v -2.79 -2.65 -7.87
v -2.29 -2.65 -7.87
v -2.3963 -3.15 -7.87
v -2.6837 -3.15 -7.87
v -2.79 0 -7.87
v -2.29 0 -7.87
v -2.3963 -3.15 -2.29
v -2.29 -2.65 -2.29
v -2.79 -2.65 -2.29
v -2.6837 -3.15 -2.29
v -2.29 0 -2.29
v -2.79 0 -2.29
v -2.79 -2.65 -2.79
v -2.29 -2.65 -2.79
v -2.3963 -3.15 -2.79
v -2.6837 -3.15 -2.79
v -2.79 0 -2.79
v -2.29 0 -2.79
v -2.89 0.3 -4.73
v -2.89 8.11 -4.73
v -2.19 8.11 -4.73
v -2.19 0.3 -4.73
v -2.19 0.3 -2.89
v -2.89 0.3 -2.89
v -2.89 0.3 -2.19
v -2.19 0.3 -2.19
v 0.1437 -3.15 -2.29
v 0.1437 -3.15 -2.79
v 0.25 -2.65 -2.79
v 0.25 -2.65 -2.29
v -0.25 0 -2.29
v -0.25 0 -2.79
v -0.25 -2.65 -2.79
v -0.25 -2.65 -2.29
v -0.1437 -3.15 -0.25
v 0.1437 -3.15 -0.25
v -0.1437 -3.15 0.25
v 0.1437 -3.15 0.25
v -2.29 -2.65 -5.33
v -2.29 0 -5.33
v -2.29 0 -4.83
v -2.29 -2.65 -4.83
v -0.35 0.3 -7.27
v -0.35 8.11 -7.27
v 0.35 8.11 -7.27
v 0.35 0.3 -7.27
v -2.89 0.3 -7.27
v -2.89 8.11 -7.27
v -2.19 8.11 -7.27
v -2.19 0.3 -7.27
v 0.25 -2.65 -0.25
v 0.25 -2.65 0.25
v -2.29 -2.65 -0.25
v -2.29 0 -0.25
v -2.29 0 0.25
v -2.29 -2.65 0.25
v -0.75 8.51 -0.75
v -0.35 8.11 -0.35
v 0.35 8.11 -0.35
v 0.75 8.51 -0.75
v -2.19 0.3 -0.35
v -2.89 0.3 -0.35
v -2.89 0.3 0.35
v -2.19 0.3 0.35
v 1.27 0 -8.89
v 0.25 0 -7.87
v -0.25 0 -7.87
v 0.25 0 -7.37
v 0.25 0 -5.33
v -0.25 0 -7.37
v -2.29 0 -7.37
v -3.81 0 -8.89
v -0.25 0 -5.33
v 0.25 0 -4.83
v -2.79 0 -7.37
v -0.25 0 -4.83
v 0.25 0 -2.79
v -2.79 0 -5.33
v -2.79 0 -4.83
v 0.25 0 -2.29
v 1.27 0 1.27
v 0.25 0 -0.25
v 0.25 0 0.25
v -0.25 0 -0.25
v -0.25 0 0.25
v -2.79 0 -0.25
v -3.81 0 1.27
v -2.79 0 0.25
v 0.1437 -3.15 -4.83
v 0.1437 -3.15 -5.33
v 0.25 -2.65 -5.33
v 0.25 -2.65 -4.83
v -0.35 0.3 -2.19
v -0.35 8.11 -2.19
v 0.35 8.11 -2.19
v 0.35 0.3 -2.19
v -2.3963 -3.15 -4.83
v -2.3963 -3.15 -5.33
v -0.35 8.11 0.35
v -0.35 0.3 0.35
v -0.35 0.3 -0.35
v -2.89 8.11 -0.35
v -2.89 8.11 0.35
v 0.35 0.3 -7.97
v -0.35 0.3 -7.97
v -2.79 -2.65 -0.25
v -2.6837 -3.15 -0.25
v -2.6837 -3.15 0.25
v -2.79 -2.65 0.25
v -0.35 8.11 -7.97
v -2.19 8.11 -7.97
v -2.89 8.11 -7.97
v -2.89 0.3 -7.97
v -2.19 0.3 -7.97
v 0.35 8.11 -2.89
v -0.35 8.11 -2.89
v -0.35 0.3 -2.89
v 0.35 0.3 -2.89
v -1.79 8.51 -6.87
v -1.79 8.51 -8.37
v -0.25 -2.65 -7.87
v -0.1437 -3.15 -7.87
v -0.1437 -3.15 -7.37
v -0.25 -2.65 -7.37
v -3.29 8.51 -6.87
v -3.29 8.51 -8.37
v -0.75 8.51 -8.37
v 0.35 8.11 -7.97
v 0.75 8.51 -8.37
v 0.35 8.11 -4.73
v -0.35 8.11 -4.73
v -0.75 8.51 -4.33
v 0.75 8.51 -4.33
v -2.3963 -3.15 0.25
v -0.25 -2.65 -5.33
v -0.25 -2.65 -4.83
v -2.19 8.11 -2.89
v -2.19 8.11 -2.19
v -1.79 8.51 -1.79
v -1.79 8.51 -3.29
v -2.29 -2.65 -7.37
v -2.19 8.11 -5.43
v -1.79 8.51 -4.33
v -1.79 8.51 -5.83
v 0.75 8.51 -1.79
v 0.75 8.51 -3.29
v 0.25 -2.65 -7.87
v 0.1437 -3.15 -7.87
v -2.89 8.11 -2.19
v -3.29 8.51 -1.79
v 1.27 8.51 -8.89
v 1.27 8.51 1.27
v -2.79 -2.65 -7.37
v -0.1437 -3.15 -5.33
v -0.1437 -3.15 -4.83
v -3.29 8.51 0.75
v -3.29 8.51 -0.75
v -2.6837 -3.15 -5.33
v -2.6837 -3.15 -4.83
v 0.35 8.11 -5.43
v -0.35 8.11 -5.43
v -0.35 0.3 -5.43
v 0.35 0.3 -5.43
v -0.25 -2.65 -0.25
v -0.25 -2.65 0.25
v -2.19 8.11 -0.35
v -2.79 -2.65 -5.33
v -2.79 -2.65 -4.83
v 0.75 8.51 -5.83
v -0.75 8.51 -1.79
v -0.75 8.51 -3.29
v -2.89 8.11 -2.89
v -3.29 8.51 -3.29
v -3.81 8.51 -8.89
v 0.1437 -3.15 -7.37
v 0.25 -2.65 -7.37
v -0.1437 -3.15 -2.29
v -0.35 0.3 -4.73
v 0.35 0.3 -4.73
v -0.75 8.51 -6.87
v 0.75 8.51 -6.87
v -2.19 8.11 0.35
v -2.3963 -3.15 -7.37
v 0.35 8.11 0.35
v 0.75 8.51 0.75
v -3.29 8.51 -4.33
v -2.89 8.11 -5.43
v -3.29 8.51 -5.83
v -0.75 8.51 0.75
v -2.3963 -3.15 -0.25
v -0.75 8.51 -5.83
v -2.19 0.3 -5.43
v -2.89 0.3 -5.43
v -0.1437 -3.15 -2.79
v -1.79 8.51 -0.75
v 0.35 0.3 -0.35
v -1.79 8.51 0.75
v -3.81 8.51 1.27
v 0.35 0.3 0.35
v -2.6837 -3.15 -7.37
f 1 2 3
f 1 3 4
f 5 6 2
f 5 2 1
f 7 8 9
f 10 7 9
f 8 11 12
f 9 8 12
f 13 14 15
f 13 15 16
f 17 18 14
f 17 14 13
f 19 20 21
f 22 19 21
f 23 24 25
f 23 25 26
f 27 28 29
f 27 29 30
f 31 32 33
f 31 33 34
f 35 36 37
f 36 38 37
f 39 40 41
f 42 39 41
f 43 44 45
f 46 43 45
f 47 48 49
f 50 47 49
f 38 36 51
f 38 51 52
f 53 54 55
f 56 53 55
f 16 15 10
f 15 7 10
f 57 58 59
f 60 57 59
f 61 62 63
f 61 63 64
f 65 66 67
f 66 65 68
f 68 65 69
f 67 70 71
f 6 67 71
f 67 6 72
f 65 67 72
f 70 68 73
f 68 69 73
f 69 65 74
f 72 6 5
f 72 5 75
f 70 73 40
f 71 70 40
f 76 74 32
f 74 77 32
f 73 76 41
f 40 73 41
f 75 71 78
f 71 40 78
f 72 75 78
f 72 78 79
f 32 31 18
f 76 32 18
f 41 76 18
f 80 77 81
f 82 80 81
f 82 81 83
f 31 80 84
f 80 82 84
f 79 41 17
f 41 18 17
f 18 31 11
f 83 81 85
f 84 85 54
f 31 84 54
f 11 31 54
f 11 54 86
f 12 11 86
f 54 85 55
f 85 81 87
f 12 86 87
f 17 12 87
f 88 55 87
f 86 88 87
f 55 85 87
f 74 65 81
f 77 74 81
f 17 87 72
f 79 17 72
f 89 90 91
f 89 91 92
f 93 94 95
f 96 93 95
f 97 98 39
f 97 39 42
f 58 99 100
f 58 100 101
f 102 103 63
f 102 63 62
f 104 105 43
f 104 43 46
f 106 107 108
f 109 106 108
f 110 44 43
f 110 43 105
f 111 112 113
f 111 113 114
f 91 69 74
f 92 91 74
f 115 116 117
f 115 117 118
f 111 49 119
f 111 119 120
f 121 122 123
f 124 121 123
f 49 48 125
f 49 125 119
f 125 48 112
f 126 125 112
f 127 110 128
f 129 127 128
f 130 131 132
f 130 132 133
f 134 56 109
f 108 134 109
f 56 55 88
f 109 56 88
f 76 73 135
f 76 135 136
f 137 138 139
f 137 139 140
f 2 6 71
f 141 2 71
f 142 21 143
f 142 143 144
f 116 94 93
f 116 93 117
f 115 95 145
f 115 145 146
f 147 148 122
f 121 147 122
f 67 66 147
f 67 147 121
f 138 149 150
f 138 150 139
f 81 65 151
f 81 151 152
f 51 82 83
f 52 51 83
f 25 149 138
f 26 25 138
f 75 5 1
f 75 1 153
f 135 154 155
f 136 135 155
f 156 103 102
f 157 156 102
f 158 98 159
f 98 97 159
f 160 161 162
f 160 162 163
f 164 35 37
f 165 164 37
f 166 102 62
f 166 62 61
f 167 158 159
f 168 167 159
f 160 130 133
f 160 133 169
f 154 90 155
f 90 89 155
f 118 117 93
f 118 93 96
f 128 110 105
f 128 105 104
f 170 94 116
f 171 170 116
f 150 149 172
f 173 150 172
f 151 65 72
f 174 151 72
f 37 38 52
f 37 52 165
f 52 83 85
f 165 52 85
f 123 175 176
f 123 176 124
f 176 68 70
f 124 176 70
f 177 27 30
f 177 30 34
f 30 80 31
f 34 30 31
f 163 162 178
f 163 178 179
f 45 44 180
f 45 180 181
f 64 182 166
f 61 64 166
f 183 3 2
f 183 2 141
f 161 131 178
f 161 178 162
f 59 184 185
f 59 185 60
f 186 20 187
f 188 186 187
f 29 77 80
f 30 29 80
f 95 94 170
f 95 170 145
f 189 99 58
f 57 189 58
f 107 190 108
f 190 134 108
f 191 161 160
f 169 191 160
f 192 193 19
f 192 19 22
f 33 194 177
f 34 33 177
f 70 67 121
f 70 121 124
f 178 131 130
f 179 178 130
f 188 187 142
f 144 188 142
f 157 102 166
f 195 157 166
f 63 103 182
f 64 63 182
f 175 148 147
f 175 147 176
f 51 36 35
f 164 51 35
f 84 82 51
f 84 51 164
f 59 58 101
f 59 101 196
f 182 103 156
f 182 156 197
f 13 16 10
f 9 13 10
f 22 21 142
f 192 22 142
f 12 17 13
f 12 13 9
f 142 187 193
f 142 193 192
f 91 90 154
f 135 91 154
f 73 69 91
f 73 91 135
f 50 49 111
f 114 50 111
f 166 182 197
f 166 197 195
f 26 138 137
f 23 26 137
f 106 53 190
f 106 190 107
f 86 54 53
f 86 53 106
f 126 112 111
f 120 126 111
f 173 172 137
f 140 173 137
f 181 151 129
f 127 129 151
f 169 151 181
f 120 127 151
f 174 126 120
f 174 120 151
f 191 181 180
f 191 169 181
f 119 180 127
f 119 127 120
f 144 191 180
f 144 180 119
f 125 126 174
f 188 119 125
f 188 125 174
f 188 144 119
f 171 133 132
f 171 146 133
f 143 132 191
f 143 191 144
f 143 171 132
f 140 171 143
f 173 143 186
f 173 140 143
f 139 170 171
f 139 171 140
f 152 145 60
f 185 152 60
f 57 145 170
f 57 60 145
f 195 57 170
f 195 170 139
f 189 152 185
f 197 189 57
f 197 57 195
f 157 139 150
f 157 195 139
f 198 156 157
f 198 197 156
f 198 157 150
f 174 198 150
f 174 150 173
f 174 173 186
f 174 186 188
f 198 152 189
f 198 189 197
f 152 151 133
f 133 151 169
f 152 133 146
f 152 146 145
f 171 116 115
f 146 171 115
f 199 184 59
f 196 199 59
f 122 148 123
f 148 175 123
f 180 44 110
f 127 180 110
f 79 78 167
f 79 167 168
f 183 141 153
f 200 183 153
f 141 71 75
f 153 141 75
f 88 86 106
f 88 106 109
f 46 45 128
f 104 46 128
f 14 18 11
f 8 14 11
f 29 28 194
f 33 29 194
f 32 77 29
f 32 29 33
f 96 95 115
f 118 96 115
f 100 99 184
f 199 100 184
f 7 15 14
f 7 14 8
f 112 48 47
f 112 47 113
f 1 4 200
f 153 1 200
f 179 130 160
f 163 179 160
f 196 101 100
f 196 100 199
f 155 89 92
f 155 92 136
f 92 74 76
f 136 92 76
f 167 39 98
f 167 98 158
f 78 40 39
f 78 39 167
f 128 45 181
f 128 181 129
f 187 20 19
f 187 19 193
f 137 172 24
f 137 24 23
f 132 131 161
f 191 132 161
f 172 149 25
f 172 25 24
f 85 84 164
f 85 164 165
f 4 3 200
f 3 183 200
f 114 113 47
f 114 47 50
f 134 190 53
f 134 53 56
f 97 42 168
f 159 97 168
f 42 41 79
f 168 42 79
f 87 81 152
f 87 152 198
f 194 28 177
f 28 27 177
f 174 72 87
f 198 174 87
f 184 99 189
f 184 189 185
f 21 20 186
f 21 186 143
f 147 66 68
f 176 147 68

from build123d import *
from OCP.BRepFilletAPI import BRepFilletAPI_MakeChamfer

# Parameters (mm, degrees)
SKETCH_1_W                          = 2.54
SKETCH_1_H                          = 2.54
EXTRUDE_1_DEPTH                     = 8.51
SKETCH_4_W                          = 0.7
SKETCH_4_H                          = 0.7
CUT_EXTRUDE_1_DEPTH                 = 8.21
CHAMFER_3_SIZE                      = 0.4
SKETCH_2_W                          = 0.5
SKETCH_2_H                          = 0.5
EXTRUDE_2_DEPTH                     = 3.15
CHAMFER_2_SIZE                      = 0.5
CHAMFER_2_SIZE2                     = 0.106278281
PATTERN_LINEAR_1_COUNT              = 4
PATTERN_LINEAR_1_PITCH              = 2.54
PATTERN_LINEAR_1_COUNT_DIR2         = 2
PATTERN_LINEAR_1_PITCH_DIR2         = 2.54
CHAMFER_3_OF_PATTERN_LINEAR_1_SIZE  = 0.4
CHAMFER_2_OF_PATTERN_LINEAR_1_SIZE  = 0.5
CHAMFER_2_OF_PATTERN_LINEAR_1_SIZE2 = 0.106278281


with BuildPart() as part:
    # Эскиз1 → Бобышка-Вытянуть1 (new body)
    with BuildSketch(Plane(origin=(0, 0, 0), x_dir=(-1, 0, 0), z_dir=(0, 1, 0))):
        Rectangle(SKETCH_1_W, SKETCH_1_H)
    extrude_1 = extrude(amount=EXTRUDE_1_DEPTH)

    # Эскиз4 → Вырез-Вытянуть1 (cut)
    with BuildSketch(Plane(origin=(0, 8.51, 0), x_dir=(1, 0, 0), z_dir=(0, 1, 0))):
        Rectangle(SKETCH_4_W, SKETCH_4_H)
    cut_extrude_1 = extrude(amount=-CUT_EXTRUDE_1_DEPTH, mode=Mode.SUBTRACT)

    # Фаска3
    chamfer_3_edges = [part.edges().sort_by_distance(p)[0] for p in [
        (-0.35, 8.51, 0),
        (0, 8.51, 0.35),
        (0.35, 8.51, 0),
        (0, 8.51, -0.35),
    ]]
    chamfer(chamfer_3_edges, length=CHAMFER_3_SIZE)

    # Эскиз2 → Бобышка-Вытянуть2 (add)
    with BuildSketch(Plane(origin=(0, 0, 0), x_dir=(-1, 0, 0), z_dir=(0, 1, 0))):
        Rectangle(SKETCH_2_W, SKETCH_2_H)
    extrude_2 = extrude(amount=-EXTRUDE_2_DEPTH)

    # Фаска2: one chamfer whose edges measure the first distance from different faces: ONE call of the kernel's chamfer builder (chamfer() names one face for all edges)
    chamfer_2_edges_1 = [part.edges().sort_by_distance(p)[0] for p in [
        (-0.25, -3.15, 0),
    ]]
    chamfer_2_side_1 = [part.faces().sort_by_distance(p)[0] for p in [
        (-0.25, -1.575, 0),
    ]]
    chamfer_2_edges_2 = [part.edges().sort_by_distance(p)[0] for p in [
        (0.25, -3.15, 0),
    ]]
    chamfer_2_side_2 = [part.faces().sort_by_distance(p)[0] for p in [
        (0.25, -1.575, 0),
    ]]
    chamfer_2 = BRepFilletAPI_MakeChamfer(part.part.solid().wrapped)
    for e in chamfer_2_edges_1:
        chamfer_2.Add(CHAMFER_2_SIZE, CHAMFER_2_SIZE2, e.wrapped, chamfer_2_side_1[0].wrapped)  # the first distance lies on this face
    for e in chamfer_2_edges_2:
        chamfer_2.Add(CHAMFER_2_SIZE, CHAMFER_2_SIZE2, e.wrapped, chamfer_2_side_2[0].wrapped)  # the first distance lies on this face
    add(Compound.cast(chamfer_2.Shape()), mode=Mode.REPLACE)

    # Линейный массив1: Бобышка-Вытянуть1, Вырез-Вытянуть1, Extrude 2 4 × 2
    with Locations(*[(-j * PATTERN_LINEAR_1_PITCH_DIR2, 0, -i * PATTERN_LINEAR_1_PITCH) for i in range(PATTERN_LINEAR_1_COUNT) for j in range(PATTERN_LINEAR_1_COUNT_DIR2) if (i, j) != (0, 0)]):
        add(extrude_1)
        add(cut_extrude_1, mode=Mode.SUBTRACT)
        add(extrude_2)

    # Фаска3 of Линейный массив1
    chamfer_3_of_pattern_linear_1_edges = [part.edges().sort_by_distance(p)[0] for p in [
        (-2.89, 8.51, 0),
        (-2.54, 8.51, 0.35),
        (-2.19, 8.51, 0),
        (-2.54, 8.51, -0.35),
        (-0.35, 8.51, -2.54),
        (0, 8.51, -2.19),
        (0.35, 8.51, -2.54),
        (0, 8.51, -2.89),
        (-2.89, 8.51, -2.54),
        (-2.54, 8.51, -2.19),
        (-2.19, 8.51, -2.54),
        (-2.54, 8.51, -2.89),
        (-0.35, 8.51, -5.08),
        (0, 8.51, -4.73),
        (0.35, 8.51, -5.08),
        (0, 8.51, -5.43),
        (-2.89, 8.51, -5.08),
        (-2.54, 8.51, -4.73),
        (-2.19, 8.51, -5.08),
        (-2.54, 8.51, -5.43),
        (-0.35, 8.51, -7.62),
        (0, 8.51, -7.27),
        (0.35, 8.51, -7.62),
        (0, 8.51, -7.97),
        (-2.89, 8.51, -7.62),
        (-2.54, 8.51, -7.27),
        (-2.19, 8.51, -7.62),
        (-2.54, 8.51, -7.97),
    ]]
    chamfer(chamfer_3_of_pattern_linear_1_edges, length=CHAMFER_3_OF_PATTERN_LINEAR_1_SIZE)

    # Фаска2 of Линейный массив1: one chamfer whose edges measure the first distance from different faces: ONE call of the kernel's chamfer builder (chamfer() names one face for all edges)
    chamfer_2_of_pattern_linear_1_edges_1 = [part.edges().sort_by_distance(p)[0] for p in [
        (-2.79, -3.15, 0),
    ]]
    chamfer_2_of_pattern_linear_1_side_1 = [part.faces().sort_by_distance(p)[0] for p in [
        (-2.79, -1.575, 0),
    ]]
    chamfer_2_of_pattern_linear_1_edges_2 = [part.edges().sort_by_distance(p)[0] for p in [
        (-2.29, -3.15, 0),
    ]]
    chamfer_2_of_pattern_linear_1_side_2 = [part.faces().sort_by_distance(p)[0] for p in [
        (-2.29, -1.575, 0),
    ]]
    chamfer_2_of_pattern_linear_1_edges_3 = [part.edges().sort_by_distance(p)[0] for p in [
        (-0.25, -3.15, -2.54),
    ]]
    chamfer_2_of_pattern_linear_1_side_3 = [part.faces().sort_by_distance(p)[0] for p in [
        (-0.25, -1.575, -2.54),
    ]]
    chamfer_2_of_pattern_linear_1_edges_4 = [part.edges().sort_by_distance(p)[0] for p in [
        (0.25, -3.15, -2.54),
    ]]
    chamfer_2_of_pattern_linear_1_side_4 = [part.faces().sort_by_distance(p)[0] for p in [
        (0.25, -1.575, -2.54),
    ]]
    chamfer_2_of_pattern_linear_1_edges_5 = [part.edges().sort_by_distance(p)[0] for p in [
        (-2.79, -3.15, -2.54),
    ]]
    chamfer_2_of_pattern_linear_1_side_5 = [part.faces().sort_by_distance(p)[0] for p in [
        (-2.79, -1.575, -2.54),
    ]]
    chamfer_2_of_pattern_linear_1_edges_6 = [part.edges().sort_by_distance(p)[0] for p in [
        (-2.29, -3.15, -2.54),
    ]]
    chamfer_2_of_pattern_linear_1_side_6 = [part.faces().sort_by_distance(p)[0] for p in [
        (-2.29, -1.575, -2.54),
    ]]
    chamfer_2_of_pattern_linear_1_edges_7 = [part.edges().sort_by_distance(p)[0] for p in [
        (-0.25, -3.15, -5.08),
    ]]
    chamfer_2_of_pattern_linear_1_side_7 = [part.faces().sort_by_distance(p)[0] for p in [
        (-0.25, -1.575, -5.08),
    ]]
    chamfer_2_of_pattern_linear_1_edges_8 = [part.edges().sort_by_distance(p)[0] for p in [
        (0.25, -3.15, -5.08),
    ]]
    chamfer_2_of_pattern_linear_1_side_8 = [part.faces().sort_by_distance(p)[0] for p in [
        (0.25, -1.575, -5.08),
    ]]
    chamfer_2_of_pattern_linear_1_edges_9 = [part.edges().sort_by_distance(p)[0] for p in [
        (-2.79, -3.15, -5.08),
    ]]
    chamfer_2_of_pattern_linear_1_side_9 = [part.faces().sort_by_distance(p)[0] for p in [
        (-2.79, -1.575, -5.08),
    ]]
    chamfer_2_of_pattern_linear_1_edges_10 = [part.edges().sort_by_distance(p)[0] for p in [
        (-2.29, -3.15, -5.08),
    ]]
    chamfer_2_of_pattern_linear_1_side_10 = [part.faces().sort_by_distance(p)[0] for p in [
        (-2.29, -1.575, -5.08),
    ]]
    chamfer_2_of_pattern_linear_1_edges_11 = [part.edges().sort_by_distance(p)[0] for p in [
        (-0.25, -3.15, -7.62),
    ]]
    chamfer_2_of_pattern_linear_1_side_11 = [part.faces().sort_by_distance(p)[0] for p in [
        (-0.25, -1.575, -7.62),
    ]]
    chamfer_2_of_pattern_linear_1_edges_12 = [part.edges().sort_by_distance(p)[0] for p in [
        (0.25, -3.15, -7.62),
    ]]
    chamfer_2_of_pattern_linear_1_side_12 = [part.faces().sort_by_distance(p)[0] for p in [
        (0.25, -1.575, -7.62),
    ]]
    chamfer_2_of_pattern_linear_1_edges_13 = [part.edges().sort_by_distance(p)[0] for p in [
        (-2.79, -3.15, -7.62),
    ]]
    chamfer_2_of_pattern_linear_1_side_13 = [part.faces().sort_by_distance(p)[0] for p in [
        (-2.79, -1.575, -7.62),
    ]]
    chamfer_2_of_pattern_linear_1_edges_14 = [part.edges().sort_by_distance(p)[0] for p in [
        (-2.29, -3.15, -7.62),
    ]]
    chamfer_2_of_pattern_linear_1_side_14 = [part.faces().sort_by_distance(p)[0] for p in [
        (-2.29, -1.575, -7.62),
    ]]
    chamfer_2_of_pattern_linear_1 = BRepFilletAPI_MakeChamfer(part.part.solid().wrapped)
    for e in chamfer_2_of_pattern_linear_1_edges_1:
        chamfer_2_of_pattern_linear_1.Add(CHAMFER_2_OF_PATTERN_LINEAR_1_SIZE, CHAMFER_2_OF_PATTERN_LINEAR_1_SIZE2, e.wrapped, chamfer_2_of_pattern_linear_1_side_1[0].wrapped)  # the first distance lies on this face
    for e in chamfer_2_of_pattern_linear_1_edges_2:
        chamfer_2_of_pattern_linear_1.Add(CHAMFER_2_OF_PATTERN_LINEAR_1_SIZE, CHAMFER_2_OF_PATTERN_LINEAR_1_SIZE2, e.wrapped, chamfer_2_of_pattern_linear_1_side_2[0].wrapped)  # the first distance lies on this face
    for e in chamfer_2_of_pattern_linear_1_edges_3:
        chamfer_2_of_pattern_linear_1.Add(CHAMFER_2_OF_PATTERN_LINEAR_1_SIZE, CHAMFER_2_OF_PATTERN_LINEAR_1_SIZE2, e.wrapped, chamfer_2_of_pattern_linear_1_side_3[0].wrapped)  # the first distance lies on this face
    for e in chamfer_2_of_pattern_linear_1_edges_4:
        chamfer_2_of_pattern_linear_1.Add(CHAMFER_2_OF_PATTERN_LINEAR_1_SIZE, CHAMFER_2_OF_PATTERN_LINEAR_1_SIZE2, e.wrapped, chamfer_2_of_pattern_linear_1_side_4[0].wrapped)  # the first distance lies on this face
    for e in chamfer_2_of_pattern_linear_1_edges_5:
        chamfer_2_of_pattern_linear_1.Add(CHAMFER_2_OF_PATTERN_LINEAR_1_SIZE, CHAMFER_2_OF_PATTERN_LINEAR_1_SIZE2, e.wrapped, chamfer_2_of_pattern_linear_1_side_5[0].wrapped)  # the first distance lies on this face
    for e in chamfer_2_of_pattern_linear_1_edges_6:
        chamfer_2_of_pattern_linear_1.Add(CHAMFER_2_OF_PATTERN_LINEAR_1_SIZE, CHAMFER_2_OF_PATTERN_LINEAR_1_SIZE2, e.wrapped, chamfer_2_of_pattern_linear_1_side_6[0].wrapped)  # the first distance lies on this face
    for e in chamfer_2_of_pattern_linear_1_edges_7:
        chamfer_2_of_pattern_linear_1.Add(CHAMFER_2_OF_PATTERN_LINEAR_1_SIZE, CHAMFER_2_OF_PATTERN_LINEAR_1_SIZE2, e.wrapped, chamfer_2_of_pattern_linear_1_side_7[0].wrapped)  # the first distance lies on this face
    for e in chamfer_2_of_pattern_linear_1_edges_8:
        chamfer_2_of_pattern_linear_1.Add(CHAMFER_2_OF_PATTERN_LINEAR_1_SIZE, CHAMFER_2_OF_PATTERN_LINEAR_1_SIZE2, e.wrapped, chamfer_2_of_pattern_linear_1_side_8[0].wrapped)  # the first distance lies on this face
    for e in chamfer_2_of_pattern_linear_1_edges_9:
        chamfer_2_of_pattern_linear_1.Add(CHAMFER_2_OF_PATTERN_LINEAR_1_SIZE, CHAMFER_2_OF_PATTERN_LINEAR_1_SIZE2, e.wrapped, chamfer_2_of_pattern_linear_1_side_9[0].wrapped)  # the first distance lies on this face
    for e in chamfer_2_of_pattern_linear_1_edges_10:
        chamfer_2_of_pattern_linear_1.Add(CHAMFER_2_OF_PATTERN_LINEAR_1_SIZE, CHAMFER_2_OF_PATTERN_LINEAR_1_SIZE2, e.wrapped, chamfer_2_of_pattern_linear_1_side_10[0].wrapped)  # the first distance lies on this face
    for e in chamfer_2_of_pattern_linear_1_edges_11:
        chamfer_2_of_pattern_linear_1.Add(CHAMFER_2_OF_PATTERN_LINEAR_1_SIZE, CHAMFER_2_OF_PATTERN_LINEAR_1_SIZE2, e.wrapped, chamfer_2_of_pattern_linear_1_side_11[0].wrapped)  # the first distance lies on this face
    for e in chamfer_2_of_pattern_linear_1_edges_12:
        chamfer_2_of_pattern_linear_1.Add(CHAMFER_2_OF_PATTERN_LINEAR_1_SIZE, CHAMFER_2_OF_PATTERN_LINEAR_1_SIZE2, e.wrapped, chamfer_2_of_pattern_linear_1_side_12[0].wrapped)  # the first distance lies on this face
    for e in chamfer_2_of_pattern_linear_1_edges_13:
        chamfer_2_of_pattern_linear_1.Add(CHAMFER_2_OF_PATTERN_LINEAR_1_SIZE, CHAMFER_2_OF_PATTERN_LINEAR_1_SIZE2, e.wrapped, chamfer_2_of_pattern_linear_1_side_13[0].wrapped)  # the first distance lies on this face
    for e in chamfer_2_of_pattern_linear_1_edges_14:
        chamfer_2_of_pattern_linear_1.Add(CHAMFER_2_OF_PATTERN_LINEAR_1_SIZE, CHAMFER_2_OF_PATTERN_LINEAR_1_SIZE2, e.wrapped, chamfer_2_of_pattern_linear_1_side_14[0].wrapped)  # the first distance lies on this face
    add(Compound.cast(chamfer_2_of_pattern_linear_1.Shape()), mode=Mode.REPLACE)


solid = part.part
